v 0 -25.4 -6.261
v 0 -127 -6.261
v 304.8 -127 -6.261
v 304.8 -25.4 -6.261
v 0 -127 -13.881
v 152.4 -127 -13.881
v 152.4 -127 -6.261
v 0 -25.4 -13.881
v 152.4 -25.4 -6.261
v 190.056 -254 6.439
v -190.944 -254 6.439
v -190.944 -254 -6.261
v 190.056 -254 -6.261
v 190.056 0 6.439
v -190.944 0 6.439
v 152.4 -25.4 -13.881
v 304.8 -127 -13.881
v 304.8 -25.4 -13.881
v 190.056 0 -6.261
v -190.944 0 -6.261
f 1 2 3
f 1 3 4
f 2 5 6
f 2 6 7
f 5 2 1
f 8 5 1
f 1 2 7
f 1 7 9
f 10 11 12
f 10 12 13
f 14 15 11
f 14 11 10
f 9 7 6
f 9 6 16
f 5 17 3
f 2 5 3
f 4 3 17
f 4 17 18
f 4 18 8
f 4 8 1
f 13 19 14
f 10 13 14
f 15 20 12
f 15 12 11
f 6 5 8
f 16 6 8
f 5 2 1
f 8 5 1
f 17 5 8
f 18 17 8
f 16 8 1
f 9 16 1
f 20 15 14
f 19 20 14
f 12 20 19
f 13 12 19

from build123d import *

# Parameters (mm, degrees)
F0_W     = 381
F0_H     = 12.7
F1_DEPTH = 254
F2_W     = 101.6
F2_H     = 7.62
F3_DEPTH = 152.4
F4_DEPTH = 304.8


with BuildPart() as f1:
    # F0 (on Front) → F1 (new body)
    with BuildSketch(Plane.XZ):
        with Locations((-0.444053, 0.088979)):
            Rectangle(F0_W, F0_H)
    extrude(amount=F1_DEPTH)


with BuildPart() as f3:
    # F2 (on Right) → F3 (new body)
    with BuildSketch(Plane.YZ):
        with Locations((-76.2, -10.071021)):
            Rectangle(F2_W, F2_H)
    extrude(amount=F3_DEPTH)


with BuildPart() as f4:
    # F2 (on Right) → F4 (new body)
    with BuildSketch(Plane.YZ):
        with Locations((-76.2, -10.071021)):
            Rectangle(F2_W, F2_H)
    extrude(amount=F4_DEPTH)


solid = Compound([f1.part, f3.part, f4.part])
